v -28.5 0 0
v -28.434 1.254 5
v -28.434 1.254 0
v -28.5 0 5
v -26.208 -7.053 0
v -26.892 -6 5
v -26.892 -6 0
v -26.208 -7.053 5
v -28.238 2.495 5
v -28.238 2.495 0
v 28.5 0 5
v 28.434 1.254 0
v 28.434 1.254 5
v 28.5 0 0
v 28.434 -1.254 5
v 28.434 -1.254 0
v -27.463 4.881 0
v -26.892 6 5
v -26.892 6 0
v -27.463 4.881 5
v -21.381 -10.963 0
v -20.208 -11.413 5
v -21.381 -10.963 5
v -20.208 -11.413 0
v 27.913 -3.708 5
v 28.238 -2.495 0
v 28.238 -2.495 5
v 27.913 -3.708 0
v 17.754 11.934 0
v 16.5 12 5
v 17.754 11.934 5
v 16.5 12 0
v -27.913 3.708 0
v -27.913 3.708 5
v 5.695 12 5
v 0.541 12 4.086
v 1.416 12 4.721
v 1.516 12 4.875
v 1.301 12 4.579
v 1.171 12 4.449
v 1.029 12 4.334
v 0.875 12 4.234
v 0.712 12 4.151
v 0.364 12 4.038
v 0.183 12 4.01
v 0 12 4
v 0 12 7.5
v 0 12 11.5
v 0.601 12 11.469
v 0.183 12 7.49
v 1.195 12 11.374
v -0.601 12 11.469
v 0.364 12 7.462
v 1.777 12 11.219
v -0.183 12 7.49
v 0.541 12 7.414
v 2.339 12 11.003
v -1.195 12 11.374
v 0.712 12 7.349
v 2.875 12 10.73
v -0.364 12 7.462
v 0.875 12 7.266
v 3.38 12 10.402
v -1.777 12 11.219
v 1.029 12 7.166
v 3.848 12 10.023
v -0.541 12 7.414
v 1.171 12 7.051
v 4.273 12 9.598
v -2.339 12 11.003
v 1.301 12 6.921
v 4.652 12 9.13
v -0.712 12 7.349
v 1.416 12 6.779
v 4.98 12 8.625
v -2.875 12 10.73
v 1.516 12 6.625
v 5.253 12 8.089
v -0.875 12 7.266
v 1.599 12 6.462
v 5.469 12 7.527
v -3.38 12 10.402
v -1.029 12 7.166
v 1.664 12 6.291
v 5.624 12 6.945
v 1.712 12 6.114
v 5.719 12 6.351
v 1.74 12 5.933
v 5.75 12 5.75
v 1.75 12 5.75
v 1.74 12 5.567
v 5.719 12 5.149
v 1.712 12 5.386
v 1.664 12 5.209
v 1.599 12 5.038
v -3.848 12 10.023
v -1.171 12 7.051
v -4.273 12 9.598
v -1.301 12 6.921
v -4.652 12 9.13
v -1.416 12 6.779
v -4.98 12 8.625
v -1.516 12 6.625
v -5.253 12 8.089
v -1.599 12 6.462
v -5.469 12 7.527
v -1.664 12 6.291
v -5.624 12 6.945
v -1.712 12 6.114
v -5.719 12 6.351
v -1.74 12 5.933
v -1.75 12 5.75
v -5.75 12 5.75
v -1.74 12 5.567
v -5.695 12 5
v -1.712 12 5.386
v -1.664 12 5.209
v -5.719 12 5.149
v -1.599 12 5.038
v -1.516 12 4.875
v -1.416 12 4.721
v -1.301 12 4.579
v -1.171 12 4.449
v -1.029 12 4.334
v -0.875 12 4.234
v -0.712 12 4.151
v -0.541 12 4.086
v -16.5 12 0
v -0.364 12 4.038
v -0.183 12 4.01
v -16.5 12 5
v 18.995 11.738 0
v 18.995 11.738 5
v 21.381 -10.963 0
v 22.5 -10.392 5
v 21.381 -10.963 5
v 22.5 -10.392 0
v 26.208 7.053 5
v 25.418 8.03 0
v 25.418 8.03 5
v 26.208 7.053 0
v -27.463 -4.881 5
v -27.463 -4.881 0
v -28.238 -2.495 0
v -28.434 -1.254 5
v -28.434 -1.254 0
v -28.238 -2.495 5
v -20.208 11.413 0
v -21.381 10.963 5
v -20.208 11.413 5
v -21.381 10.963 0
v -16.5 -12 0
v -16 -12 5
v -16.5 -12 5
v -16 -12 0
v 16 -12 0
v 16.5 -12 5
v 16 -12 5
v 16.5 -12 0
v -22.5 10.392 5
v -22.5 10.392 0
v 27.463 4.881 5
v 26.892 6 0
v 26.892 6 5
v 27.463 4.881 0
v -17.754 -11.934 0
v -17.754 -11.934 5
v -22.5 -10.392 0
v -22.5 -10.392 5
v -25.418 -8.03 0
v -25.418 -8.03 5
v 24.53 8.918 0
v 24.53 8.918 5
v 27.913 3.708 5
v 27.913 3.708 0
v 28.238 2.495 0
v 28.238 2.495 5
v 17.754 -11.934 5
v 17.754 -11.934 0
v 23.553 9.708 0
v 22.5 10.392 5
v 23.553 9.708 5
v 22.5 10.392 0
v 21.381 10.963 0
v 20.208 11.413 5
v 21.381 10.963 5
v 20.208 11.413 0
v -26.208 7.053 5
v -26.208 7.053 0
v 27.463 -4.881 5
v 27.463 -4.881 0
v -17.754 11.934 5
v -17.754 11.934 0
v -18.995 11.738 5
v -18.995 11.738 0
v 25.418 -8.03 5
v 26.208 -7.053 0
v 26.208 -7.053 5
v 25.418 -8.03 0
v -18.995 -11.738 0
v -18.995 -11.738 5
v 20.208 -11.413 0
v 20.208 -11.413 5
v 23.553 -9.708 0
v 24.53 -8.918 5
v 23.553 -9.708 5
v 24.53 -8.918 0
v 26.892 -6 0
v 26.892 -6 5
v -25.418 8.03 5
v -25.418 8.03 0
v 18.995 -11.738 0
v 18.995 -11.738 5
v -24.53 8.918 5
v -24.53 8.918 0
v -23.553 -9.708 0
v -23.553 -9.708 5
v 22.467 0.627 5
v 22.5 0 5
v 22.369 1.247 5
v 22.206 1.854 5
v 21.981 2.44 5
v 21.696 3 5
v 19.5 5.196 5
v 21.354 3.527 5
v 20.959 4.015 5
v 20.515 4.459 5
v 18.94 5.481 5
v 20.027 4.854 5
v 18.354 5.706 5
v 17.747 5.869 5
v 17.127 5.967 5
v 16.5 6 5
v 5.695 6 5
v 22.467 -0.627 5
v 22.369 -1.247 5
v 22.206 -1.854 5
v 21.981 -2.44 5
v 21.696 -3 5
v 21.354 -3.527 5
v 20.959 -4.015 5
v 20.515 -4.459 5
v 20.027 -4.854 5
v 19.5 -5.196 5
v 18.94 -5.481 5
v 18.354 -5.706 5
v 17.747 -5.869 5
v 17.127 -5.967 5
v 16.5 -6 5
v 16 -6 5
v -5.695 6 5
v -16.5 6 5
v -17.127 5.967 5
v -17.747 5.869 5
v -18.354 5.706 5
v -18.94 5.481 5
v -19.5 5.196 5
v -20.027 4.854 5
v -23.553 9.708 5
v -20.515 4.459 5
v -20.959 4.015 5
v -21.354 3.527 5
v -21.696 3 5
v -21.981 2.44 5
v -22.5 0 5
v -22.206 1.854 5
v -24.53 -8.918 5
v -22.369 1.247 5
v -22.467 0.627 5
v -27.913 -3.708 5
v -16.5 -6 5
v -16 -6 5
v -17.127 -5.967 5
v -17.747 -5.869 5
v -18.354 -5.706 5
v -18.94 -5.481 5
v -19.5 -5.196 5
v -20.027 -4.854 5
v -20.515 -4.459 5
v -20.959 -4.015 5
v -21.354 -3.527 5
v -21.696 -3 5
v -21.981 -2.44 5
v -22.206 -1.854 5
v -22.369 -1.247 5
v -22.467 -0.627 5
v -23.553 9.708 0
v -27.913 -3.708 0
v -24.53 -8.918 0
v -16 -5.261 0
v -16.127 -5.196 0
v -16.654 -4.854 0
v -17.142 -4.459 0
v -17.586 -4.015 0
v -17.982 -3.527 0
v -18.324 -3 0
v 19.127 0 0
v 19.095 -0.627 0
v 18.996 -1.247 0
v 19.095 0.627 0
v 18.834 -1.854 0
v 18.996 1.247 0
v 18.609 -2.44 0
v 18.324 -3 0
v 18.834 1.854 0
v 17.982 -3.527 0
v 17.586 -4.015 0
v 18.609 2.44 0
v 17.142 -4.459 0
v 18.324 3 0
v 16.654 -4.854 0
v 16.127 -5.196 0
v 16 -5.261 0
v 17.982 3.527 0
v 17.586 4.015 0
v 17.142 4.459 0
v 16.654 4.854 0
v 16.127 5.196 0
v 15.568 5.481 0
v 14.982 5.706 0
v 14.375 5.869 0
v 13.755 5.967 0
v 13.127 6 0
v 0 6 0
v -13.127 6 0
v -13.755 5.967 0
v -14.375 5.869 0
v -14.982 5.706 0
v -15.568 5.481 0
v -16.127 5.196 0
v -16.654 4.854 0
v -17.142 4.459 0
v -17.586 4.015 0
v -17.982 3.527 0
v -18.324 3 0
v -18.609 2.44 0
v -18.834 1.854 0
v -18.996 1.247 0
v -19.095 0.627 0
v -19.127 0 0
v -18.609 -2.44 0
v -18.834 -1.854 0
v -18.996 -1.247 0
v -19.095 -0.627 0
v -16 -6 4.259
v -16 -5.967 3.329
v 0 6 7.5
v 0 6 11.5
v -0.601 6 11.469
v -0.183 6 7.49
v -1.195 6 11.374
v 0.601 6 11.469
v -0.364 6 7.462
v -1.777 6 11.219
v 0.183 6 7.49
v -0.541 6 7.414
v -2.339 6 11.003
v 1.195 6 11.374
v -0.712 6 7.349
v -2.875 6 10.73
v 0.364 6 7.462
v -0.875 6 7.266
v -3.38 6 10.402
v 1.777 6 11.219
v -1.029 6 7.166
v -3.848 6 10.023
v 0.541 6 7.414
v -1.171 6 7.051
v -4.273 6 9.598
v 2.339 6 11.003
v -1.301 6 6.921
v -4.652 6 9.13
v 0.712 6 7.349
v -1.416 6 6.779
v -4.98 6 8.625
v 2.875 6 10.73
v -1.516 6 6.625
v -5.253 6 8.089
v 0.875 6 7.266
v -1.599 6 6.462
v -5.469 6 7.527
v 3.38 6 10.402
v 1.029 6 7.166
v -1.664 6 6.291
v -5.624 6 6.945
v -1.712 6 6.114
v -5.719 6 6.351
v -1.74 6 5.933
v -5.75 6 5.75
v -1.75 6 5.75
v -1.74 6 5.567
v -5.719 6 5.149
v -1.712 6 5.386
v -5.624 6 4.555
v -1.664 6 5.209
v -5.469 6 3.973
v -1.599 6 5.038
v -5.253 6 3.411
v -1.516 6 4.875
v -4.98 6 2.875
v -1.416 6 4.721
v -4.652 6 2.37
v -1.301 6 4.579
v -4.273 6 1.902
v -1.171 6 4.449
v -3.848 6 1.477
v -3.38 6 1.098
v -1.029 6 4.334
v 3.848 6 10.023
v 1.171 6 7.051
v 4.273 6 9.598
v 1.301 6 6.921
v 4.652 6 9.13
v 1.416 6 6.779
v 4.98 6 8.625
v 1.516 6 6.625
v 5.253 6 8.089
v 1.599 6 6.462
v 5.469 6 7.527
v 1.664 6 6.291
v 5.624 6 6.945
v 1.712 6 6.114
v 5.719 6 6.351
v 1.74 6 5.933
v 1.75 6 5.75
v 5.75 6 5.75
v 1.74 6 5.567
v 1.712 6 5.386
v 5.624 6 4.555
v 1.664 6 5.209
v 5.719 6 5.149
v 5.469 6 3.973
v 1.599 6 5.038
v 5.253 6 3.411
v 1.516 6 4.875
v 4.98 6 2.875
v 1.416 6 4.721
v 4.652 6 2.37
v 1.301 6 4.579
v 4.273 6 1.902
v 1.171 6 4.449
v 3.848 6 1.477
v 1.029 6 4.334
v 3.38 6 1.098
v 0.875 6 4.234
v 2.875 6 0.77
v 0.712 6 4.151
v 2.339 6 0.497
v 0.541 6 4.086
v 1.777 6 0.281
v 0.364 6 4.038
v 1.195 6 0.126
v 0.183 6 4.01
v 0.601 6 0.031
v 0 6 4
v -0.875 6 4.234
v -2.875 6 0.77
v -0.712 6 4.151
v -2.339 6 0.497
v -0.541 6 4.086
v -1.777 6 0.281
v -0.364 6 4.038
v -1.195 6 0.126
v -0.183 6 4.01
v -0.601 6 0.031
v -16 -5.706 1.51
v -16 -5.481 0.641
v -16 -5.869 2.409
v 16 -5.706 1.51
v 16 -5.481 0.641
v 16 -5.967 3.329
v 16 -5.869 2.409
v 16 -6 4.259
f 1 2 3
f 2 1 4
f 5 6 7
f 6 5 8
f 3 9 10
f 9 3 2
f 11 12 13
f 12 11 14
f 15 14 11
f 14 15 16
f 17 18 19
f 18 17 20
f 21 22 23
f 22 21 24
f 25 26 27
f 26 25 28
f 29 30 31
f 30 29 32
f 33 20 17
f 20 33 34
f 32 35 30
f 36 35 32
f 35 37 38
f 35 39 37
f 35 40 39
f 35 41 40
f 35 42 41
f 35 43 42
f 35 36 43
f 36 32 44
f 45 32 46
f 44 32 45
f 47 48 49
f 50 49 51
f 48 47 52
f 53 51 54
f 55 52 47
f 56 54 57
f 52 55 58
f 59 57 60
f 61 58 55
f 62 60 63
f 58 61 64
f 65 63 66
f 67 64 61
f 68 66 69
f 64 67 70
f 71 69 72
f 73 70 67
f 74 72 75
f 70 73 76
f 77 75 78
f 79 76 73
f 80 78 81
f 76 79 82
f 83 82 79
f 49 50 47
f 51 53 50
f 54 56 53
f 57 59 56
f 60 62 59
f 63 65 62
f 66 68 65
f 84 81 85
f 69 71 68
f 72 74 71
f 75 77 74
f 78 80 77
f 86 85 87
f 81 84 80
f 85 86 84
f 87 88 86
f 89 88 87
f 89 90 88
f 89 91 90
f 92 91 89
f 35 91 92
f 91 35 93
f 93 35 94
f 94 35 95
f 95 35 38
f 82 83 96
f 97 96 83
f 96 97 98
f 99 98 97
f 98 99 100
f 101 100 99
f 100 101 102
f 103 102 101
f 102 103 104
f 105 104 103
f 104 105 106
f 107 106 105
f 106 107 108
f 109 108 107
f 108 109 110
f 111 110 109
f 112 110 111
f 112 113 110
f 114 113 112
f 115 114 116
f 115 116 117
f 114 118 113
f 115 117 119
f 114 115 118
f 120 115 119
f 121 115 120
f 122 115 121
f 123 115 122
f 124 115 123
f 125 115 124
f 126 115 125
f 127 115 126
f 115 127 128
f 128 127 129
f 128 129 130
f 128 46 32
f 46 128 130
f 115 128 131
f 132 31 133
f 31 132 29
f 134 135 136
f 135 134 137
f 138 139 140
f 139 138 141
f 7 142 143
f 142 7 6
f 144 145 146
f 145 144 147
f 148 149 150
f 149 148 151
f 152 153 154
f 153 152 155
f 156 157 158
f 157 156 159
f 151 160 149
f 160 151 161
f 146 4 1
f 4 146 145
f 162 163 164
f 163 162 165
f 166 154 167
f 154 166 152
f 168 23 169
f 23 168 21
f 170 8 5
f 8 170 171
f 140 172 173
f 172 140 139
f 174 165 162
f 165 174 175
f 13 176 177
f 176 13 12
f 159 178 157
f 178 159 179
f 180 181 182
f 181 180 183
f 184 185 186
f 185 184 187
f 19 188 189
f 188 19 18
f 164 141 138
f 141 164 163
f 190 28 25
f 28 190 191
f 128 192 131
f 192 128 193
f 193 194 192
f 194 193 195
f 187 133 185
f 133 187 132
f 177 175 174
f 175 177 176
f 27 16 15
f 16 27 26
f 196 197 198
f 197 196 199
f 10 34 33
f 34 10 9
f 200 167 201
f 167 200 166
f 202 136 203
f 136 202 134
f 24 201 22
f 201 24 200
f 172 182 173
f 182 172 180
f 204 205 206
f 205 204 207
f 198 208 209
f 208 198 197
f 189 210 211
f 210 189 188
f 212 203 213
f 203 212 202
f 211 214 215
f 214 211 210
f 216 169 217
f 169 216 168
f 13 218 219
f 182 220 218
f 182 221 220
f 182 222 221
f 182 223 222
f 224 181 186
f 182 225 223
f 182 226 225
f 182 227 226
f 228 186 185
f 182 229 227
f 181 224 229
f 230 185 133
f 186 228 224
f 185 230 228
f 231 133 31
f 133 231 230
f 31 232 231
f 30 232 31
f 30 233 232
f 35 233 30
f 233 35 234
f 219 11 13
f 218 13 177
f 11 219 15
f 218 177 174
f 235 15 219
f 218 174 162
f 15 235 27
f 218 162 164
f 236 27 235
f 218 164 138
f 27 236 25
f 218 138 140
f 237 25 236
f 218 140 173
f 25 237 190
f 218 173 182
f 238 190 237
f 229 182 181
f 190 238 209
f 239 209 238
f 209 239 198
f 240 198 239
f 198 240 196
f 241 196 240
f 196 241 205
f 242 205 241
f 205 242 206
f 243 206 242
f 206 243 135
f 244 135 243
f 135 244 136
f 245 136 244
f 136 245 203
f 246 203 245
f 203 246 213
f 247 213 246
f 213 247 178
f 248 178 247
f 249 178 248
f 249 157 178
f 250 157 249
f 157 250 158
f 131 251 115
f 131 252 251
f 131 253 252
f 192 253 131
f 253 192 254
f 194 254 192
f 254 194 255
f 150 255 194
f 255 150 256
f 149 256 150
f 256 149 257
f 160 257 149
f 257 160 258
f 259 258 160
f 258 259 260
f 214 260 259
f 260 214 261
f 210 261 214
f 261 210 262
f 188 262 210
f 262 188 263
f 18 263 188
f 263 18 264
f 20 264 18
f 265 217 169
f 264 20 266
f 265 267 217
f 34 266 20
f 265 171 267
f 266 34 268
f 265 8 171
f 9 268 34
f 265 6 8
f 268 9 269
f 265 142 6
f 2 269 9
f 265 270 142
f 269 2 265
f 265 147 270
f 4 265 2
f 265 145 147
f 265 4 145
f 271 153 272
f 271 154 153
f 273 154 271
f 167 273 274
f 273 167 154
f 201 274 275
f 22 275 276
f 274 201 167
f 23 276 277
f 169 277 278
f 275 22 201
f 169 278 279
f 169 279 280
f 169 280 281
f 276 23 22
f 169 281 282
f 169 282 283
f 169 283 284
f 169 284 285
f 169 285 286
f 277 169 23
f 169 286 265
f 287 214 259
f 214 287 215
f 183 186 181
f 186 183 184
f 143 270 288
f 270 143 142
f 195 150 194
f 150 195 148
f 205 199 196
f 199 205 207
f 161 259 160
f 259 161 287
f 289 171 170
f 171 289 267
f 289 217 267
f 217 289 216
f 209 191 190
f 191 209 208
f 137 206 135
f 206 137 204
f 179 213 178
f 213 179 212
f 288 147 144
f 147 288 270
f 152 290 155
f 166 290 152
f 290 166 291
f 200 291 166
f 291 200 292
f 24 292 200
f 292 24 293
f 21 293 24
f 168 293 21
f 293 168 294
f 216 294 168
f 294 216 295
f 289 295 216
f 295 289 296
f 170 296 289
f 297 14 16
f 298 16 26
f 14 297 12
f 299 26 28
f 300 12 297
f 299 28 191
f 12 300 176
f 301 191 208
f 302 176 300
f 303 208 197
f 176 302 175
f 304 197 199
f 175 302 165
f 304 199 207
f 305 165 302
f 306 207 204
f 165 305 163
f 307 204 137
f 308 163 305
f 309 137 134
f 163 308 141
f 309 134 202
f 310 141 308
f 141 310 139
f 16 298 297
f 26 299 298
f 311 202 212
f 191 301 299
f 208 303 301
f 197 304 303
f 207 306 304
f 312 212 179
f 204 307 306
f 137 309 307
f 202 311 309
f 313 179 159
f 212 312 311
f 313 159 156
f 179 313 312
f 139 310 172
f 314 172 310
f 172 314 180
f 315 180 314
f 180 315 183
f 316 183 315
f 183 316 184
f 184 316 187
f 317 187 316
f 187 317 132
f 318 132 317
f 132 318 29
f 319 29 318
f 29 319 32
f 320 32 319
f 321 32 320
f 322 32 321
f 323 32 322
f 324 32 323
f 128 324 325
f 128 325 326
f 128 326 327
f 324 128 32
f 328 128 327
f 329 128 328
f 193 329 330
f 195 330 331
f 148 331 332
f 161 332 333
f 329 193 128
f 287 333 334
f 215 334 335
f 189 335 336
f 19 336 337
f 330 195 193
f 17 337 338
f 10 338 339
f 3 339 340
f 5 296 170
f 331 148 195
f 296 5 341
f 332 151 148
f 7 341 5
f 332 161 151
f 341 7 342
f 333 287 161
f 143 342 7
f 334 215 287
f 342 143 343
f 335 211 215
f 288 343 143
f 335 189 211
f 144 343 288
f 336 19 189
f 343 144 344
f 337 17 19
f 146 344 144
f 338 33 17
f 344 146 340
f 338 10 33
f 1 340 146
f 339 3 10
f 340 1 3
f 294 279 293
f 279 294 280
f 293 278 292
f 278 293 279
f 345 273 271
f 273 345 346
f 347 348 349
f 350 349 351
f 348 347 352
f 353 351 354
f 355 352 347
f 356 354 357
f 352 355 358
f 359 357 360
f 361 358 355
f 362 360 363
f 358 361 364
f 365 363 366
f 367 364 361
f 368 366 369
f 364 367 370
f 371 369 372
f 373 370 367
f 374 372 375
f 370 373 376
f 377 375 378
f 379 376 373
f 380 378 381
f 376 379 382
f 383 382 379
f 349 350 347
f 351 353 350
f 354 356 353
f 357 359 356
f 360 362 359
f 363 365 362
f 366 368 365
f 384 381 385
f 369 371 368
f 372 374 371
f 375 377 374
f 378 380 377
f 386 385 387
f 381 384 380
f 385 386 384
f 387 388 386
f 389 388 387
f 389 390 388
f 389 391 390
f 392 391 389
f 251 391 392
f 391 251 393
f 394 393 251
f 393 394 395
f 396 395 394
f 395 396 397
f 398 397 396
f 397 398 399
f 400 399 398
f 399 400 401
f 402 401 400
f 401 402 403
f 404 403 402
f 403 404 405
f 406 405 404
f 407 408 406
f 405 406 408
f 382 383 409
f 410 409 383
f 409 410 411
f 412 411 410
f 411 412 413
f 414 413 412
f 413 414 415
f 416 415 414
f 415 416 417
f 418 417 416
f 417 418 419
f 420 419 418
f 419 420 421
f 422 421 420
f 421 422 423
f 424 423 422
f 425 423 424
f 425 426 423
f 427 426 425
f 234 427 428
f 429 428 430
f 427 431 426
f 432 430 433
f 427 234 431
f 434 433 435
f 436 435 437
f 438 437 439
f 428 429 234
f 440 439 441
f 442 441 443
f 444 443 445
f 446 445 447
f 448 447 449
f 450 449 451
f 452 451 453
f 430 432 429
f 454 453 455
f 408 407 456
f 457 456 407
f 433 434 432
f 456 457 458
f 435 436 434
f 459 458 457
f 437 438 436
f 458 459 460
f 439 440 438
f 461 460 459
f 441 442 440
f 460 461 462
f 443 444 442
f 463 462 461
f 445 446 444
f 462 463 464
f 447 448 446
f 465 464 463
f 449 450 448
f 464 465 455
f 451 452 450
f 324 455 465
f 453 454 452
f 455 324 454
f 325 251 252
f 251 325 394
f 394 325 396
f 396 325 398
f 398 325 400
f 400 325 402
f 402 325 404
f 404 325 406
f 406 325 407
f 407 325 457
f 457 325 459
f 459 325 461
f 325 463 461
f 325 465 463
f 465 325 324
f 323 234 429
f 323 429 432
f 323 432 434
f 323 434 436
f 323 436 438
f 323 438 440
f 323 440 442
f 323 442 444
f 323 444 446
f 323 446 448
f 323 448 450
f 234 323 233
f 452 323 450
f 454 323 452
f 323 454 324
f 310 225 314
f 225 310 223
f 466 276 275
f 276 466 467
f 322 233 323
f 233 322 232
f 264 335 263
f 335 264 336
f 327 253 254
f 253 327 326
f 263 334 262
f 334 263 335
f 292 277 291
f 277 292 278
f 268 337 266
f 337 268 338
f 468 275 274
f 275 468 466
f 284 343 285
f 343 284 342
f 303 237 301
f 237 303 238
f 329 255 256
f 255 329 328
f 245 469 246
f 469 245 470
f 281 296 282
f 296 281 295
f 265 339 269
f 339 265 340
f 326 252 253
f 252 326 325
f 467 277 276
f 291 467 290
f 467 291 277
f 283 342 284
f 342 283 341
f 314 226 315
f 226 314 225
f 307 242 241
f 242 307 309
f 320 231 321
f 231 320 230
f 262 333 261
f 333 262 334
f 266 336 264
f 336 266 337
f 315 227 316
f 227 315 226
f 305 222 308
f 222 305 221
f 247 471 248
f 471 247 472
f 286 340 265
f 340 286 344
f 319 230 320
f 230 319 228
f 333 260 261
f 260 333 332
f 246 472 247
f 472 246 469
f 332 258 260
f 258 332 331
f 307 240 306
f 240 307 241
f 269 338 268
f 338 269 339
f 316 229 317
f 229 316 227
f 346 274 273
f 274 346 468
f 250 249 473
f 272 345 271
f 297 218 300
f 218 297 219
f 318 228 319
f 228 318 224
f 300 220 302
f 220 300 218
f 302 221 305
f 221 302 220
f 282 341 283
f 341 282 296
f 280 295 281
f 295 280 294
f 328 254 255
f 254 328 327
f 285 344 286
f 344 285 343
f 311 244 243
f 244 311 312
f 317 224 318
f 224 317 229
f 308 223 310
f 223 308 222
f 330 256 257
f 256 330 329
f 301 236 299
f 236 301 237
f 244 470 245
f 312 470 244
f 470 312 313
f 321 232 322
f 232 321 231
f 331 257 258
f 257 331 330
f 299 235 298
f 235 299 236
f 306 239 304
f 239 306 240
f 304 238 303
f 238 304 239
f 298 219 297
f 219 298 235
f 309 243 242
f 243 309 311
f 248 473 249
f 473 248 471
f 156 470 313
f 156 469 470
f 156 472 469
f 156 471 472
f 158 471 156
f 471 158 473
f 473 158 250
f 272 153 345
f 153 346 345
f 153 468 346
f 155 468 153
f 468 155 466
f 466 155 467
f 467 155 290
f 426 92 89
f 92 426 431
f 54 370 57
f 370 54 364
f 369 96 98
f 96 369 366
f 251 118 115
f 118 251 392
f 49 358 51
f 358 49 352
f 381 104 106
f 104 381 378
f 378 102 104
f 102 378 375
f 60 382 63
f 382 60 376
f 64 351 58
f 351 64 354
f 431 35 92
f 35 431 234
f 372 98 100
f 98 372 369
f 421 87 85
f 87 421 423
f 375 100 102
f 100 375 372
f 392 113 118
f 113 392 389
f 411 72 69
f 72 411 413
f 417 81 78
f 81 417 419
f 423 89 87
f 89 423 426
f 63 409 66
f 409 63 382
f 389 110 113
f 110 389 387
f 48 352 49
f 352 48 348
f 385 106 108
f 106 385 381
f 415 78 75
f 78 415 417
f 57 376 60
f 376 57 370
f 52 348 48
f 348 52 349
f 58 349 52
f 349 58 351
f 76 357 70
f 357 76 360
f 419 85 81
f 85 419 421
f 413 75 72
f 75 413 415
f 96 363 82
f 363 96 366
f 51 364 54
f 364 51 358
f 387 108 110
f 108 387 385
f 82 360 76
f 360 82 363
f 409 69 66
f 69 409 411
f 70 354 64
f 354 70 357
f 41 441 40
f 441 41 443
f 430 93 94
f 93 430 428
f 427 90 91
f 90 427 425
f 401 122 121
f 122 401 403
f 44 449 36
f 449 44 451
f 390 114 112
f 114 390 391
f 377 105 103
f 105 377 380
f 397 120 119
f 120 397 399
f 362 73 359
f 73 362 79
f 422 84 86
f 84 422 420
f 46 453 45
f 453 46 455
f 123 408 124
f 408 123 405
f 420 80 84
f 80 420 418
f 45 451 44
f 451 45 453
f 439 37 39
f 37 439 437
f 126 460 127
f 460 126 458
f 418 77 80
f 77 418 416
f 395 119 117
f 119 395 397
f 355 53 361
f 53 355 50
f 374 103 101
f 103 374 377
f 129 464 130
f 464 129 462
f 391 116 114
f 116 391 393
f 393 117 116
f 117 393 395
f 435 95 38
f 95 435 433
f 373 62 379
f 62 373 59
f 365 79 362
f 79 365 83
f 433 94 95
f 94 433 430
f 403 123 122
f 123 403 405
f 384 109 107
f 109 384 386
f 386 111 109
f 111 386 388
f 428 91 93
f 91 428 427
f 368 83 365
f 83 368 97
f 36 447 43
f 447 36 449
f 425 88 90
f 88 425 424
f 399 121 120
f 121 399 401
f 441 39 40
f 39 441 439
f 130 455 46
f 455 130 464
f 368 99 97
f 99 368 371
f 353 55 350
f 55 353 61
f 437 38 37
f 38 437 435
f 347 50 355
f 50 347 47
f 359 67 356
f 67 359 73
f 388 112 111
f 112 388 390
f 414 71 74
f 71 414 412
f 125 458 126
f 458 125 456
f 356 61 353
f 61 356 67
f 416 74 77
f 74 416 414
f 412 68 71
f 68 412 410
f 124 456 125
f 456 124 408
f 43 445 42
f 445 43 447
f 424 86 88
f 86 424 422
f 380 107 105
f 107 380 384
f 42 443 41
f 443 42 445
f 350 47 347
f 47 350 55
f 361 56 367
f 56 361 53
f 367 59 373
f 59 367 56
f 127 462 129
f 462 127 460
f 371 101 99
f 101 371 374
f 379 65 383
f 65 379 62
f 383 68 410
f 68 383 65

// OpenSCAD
// Customizable Plier Holder Clip

// Height of clip from top to bottom (not including mounting screw tab).
clip_height = 5;

// Width of clip arms (width of buffer around top edge of cutout).
clip_thickness = 6;

// Tool handle diameter (set slightly larger than actual diameter for easy fit).
handle_diameter = 12;

// Width of handle holder cutout at top surface of clip.
cutout_top_width = 45;

// Width of handle holder cutout at bottom surface of clip. Set less than top width to match slope to tool handle angle.
cutout_bottom_width = 38.2549;

// Width of opening in the front of the clip. Should typically be less than cutout width.
notch_width = 32;

// Diameter of mounting screw hole.
screw_diameter = 3.5;

// Width of tab surrounding mounting screw hole. 
screw_border = 4;

/* [Hidden] */

handle_radius = handle_diameter/2;
screw_radius = screw_diameter/2;
$fn = 60;

difference() {
	union() {
		difference() {
			Lozenge(clip_height, cutout_top_width, handle_radius + clip_thickness);

			HandleCutout();
			NotchOpening();
		}
		ScrewMount();
	}
	ScrewHole();
}

module ScrewMount() {
	translate([0, handle_radius+clip_thickness, screw_border + screw_radius])
	rotate([90, 0, 0])
	linear_extrude(height=clip_thickness)
	circle(r=screw_radius + screw_border);
}

module ScrewHole() {
	translate([0, handle_radius + clip_thickness + 1, screw_border + screw_radius])
	rotate([90, 0, 0])
	linear_extrude(height=clip_thickness+2)
	circle(r=screw_radius);
}

module NotchOpening() {
	translate([0, -(clip_thickness + handle_radius)/2, clip_height/2])
	cube([notch_width, clip_thickness + handle_radius, clip_height], center=true);
}

module HandleCutout() {
	hull() {
		translate([0, 0, clip_height])
		Lozenge(1, cutout_top_width, handle_radius);		
		Lozenge(1, cutout_bottom_width, handle_radius);
	}
}

module Lozenge(height, width, radius) {
	linear_extrude(height=height)
	hull() {
		translate([-width/2 + handle_radius, 0, 0]) circle(r=radius);
		translate([ width/2 - handle_radius, 0, 0]) circle(r=radius);
	}
}
